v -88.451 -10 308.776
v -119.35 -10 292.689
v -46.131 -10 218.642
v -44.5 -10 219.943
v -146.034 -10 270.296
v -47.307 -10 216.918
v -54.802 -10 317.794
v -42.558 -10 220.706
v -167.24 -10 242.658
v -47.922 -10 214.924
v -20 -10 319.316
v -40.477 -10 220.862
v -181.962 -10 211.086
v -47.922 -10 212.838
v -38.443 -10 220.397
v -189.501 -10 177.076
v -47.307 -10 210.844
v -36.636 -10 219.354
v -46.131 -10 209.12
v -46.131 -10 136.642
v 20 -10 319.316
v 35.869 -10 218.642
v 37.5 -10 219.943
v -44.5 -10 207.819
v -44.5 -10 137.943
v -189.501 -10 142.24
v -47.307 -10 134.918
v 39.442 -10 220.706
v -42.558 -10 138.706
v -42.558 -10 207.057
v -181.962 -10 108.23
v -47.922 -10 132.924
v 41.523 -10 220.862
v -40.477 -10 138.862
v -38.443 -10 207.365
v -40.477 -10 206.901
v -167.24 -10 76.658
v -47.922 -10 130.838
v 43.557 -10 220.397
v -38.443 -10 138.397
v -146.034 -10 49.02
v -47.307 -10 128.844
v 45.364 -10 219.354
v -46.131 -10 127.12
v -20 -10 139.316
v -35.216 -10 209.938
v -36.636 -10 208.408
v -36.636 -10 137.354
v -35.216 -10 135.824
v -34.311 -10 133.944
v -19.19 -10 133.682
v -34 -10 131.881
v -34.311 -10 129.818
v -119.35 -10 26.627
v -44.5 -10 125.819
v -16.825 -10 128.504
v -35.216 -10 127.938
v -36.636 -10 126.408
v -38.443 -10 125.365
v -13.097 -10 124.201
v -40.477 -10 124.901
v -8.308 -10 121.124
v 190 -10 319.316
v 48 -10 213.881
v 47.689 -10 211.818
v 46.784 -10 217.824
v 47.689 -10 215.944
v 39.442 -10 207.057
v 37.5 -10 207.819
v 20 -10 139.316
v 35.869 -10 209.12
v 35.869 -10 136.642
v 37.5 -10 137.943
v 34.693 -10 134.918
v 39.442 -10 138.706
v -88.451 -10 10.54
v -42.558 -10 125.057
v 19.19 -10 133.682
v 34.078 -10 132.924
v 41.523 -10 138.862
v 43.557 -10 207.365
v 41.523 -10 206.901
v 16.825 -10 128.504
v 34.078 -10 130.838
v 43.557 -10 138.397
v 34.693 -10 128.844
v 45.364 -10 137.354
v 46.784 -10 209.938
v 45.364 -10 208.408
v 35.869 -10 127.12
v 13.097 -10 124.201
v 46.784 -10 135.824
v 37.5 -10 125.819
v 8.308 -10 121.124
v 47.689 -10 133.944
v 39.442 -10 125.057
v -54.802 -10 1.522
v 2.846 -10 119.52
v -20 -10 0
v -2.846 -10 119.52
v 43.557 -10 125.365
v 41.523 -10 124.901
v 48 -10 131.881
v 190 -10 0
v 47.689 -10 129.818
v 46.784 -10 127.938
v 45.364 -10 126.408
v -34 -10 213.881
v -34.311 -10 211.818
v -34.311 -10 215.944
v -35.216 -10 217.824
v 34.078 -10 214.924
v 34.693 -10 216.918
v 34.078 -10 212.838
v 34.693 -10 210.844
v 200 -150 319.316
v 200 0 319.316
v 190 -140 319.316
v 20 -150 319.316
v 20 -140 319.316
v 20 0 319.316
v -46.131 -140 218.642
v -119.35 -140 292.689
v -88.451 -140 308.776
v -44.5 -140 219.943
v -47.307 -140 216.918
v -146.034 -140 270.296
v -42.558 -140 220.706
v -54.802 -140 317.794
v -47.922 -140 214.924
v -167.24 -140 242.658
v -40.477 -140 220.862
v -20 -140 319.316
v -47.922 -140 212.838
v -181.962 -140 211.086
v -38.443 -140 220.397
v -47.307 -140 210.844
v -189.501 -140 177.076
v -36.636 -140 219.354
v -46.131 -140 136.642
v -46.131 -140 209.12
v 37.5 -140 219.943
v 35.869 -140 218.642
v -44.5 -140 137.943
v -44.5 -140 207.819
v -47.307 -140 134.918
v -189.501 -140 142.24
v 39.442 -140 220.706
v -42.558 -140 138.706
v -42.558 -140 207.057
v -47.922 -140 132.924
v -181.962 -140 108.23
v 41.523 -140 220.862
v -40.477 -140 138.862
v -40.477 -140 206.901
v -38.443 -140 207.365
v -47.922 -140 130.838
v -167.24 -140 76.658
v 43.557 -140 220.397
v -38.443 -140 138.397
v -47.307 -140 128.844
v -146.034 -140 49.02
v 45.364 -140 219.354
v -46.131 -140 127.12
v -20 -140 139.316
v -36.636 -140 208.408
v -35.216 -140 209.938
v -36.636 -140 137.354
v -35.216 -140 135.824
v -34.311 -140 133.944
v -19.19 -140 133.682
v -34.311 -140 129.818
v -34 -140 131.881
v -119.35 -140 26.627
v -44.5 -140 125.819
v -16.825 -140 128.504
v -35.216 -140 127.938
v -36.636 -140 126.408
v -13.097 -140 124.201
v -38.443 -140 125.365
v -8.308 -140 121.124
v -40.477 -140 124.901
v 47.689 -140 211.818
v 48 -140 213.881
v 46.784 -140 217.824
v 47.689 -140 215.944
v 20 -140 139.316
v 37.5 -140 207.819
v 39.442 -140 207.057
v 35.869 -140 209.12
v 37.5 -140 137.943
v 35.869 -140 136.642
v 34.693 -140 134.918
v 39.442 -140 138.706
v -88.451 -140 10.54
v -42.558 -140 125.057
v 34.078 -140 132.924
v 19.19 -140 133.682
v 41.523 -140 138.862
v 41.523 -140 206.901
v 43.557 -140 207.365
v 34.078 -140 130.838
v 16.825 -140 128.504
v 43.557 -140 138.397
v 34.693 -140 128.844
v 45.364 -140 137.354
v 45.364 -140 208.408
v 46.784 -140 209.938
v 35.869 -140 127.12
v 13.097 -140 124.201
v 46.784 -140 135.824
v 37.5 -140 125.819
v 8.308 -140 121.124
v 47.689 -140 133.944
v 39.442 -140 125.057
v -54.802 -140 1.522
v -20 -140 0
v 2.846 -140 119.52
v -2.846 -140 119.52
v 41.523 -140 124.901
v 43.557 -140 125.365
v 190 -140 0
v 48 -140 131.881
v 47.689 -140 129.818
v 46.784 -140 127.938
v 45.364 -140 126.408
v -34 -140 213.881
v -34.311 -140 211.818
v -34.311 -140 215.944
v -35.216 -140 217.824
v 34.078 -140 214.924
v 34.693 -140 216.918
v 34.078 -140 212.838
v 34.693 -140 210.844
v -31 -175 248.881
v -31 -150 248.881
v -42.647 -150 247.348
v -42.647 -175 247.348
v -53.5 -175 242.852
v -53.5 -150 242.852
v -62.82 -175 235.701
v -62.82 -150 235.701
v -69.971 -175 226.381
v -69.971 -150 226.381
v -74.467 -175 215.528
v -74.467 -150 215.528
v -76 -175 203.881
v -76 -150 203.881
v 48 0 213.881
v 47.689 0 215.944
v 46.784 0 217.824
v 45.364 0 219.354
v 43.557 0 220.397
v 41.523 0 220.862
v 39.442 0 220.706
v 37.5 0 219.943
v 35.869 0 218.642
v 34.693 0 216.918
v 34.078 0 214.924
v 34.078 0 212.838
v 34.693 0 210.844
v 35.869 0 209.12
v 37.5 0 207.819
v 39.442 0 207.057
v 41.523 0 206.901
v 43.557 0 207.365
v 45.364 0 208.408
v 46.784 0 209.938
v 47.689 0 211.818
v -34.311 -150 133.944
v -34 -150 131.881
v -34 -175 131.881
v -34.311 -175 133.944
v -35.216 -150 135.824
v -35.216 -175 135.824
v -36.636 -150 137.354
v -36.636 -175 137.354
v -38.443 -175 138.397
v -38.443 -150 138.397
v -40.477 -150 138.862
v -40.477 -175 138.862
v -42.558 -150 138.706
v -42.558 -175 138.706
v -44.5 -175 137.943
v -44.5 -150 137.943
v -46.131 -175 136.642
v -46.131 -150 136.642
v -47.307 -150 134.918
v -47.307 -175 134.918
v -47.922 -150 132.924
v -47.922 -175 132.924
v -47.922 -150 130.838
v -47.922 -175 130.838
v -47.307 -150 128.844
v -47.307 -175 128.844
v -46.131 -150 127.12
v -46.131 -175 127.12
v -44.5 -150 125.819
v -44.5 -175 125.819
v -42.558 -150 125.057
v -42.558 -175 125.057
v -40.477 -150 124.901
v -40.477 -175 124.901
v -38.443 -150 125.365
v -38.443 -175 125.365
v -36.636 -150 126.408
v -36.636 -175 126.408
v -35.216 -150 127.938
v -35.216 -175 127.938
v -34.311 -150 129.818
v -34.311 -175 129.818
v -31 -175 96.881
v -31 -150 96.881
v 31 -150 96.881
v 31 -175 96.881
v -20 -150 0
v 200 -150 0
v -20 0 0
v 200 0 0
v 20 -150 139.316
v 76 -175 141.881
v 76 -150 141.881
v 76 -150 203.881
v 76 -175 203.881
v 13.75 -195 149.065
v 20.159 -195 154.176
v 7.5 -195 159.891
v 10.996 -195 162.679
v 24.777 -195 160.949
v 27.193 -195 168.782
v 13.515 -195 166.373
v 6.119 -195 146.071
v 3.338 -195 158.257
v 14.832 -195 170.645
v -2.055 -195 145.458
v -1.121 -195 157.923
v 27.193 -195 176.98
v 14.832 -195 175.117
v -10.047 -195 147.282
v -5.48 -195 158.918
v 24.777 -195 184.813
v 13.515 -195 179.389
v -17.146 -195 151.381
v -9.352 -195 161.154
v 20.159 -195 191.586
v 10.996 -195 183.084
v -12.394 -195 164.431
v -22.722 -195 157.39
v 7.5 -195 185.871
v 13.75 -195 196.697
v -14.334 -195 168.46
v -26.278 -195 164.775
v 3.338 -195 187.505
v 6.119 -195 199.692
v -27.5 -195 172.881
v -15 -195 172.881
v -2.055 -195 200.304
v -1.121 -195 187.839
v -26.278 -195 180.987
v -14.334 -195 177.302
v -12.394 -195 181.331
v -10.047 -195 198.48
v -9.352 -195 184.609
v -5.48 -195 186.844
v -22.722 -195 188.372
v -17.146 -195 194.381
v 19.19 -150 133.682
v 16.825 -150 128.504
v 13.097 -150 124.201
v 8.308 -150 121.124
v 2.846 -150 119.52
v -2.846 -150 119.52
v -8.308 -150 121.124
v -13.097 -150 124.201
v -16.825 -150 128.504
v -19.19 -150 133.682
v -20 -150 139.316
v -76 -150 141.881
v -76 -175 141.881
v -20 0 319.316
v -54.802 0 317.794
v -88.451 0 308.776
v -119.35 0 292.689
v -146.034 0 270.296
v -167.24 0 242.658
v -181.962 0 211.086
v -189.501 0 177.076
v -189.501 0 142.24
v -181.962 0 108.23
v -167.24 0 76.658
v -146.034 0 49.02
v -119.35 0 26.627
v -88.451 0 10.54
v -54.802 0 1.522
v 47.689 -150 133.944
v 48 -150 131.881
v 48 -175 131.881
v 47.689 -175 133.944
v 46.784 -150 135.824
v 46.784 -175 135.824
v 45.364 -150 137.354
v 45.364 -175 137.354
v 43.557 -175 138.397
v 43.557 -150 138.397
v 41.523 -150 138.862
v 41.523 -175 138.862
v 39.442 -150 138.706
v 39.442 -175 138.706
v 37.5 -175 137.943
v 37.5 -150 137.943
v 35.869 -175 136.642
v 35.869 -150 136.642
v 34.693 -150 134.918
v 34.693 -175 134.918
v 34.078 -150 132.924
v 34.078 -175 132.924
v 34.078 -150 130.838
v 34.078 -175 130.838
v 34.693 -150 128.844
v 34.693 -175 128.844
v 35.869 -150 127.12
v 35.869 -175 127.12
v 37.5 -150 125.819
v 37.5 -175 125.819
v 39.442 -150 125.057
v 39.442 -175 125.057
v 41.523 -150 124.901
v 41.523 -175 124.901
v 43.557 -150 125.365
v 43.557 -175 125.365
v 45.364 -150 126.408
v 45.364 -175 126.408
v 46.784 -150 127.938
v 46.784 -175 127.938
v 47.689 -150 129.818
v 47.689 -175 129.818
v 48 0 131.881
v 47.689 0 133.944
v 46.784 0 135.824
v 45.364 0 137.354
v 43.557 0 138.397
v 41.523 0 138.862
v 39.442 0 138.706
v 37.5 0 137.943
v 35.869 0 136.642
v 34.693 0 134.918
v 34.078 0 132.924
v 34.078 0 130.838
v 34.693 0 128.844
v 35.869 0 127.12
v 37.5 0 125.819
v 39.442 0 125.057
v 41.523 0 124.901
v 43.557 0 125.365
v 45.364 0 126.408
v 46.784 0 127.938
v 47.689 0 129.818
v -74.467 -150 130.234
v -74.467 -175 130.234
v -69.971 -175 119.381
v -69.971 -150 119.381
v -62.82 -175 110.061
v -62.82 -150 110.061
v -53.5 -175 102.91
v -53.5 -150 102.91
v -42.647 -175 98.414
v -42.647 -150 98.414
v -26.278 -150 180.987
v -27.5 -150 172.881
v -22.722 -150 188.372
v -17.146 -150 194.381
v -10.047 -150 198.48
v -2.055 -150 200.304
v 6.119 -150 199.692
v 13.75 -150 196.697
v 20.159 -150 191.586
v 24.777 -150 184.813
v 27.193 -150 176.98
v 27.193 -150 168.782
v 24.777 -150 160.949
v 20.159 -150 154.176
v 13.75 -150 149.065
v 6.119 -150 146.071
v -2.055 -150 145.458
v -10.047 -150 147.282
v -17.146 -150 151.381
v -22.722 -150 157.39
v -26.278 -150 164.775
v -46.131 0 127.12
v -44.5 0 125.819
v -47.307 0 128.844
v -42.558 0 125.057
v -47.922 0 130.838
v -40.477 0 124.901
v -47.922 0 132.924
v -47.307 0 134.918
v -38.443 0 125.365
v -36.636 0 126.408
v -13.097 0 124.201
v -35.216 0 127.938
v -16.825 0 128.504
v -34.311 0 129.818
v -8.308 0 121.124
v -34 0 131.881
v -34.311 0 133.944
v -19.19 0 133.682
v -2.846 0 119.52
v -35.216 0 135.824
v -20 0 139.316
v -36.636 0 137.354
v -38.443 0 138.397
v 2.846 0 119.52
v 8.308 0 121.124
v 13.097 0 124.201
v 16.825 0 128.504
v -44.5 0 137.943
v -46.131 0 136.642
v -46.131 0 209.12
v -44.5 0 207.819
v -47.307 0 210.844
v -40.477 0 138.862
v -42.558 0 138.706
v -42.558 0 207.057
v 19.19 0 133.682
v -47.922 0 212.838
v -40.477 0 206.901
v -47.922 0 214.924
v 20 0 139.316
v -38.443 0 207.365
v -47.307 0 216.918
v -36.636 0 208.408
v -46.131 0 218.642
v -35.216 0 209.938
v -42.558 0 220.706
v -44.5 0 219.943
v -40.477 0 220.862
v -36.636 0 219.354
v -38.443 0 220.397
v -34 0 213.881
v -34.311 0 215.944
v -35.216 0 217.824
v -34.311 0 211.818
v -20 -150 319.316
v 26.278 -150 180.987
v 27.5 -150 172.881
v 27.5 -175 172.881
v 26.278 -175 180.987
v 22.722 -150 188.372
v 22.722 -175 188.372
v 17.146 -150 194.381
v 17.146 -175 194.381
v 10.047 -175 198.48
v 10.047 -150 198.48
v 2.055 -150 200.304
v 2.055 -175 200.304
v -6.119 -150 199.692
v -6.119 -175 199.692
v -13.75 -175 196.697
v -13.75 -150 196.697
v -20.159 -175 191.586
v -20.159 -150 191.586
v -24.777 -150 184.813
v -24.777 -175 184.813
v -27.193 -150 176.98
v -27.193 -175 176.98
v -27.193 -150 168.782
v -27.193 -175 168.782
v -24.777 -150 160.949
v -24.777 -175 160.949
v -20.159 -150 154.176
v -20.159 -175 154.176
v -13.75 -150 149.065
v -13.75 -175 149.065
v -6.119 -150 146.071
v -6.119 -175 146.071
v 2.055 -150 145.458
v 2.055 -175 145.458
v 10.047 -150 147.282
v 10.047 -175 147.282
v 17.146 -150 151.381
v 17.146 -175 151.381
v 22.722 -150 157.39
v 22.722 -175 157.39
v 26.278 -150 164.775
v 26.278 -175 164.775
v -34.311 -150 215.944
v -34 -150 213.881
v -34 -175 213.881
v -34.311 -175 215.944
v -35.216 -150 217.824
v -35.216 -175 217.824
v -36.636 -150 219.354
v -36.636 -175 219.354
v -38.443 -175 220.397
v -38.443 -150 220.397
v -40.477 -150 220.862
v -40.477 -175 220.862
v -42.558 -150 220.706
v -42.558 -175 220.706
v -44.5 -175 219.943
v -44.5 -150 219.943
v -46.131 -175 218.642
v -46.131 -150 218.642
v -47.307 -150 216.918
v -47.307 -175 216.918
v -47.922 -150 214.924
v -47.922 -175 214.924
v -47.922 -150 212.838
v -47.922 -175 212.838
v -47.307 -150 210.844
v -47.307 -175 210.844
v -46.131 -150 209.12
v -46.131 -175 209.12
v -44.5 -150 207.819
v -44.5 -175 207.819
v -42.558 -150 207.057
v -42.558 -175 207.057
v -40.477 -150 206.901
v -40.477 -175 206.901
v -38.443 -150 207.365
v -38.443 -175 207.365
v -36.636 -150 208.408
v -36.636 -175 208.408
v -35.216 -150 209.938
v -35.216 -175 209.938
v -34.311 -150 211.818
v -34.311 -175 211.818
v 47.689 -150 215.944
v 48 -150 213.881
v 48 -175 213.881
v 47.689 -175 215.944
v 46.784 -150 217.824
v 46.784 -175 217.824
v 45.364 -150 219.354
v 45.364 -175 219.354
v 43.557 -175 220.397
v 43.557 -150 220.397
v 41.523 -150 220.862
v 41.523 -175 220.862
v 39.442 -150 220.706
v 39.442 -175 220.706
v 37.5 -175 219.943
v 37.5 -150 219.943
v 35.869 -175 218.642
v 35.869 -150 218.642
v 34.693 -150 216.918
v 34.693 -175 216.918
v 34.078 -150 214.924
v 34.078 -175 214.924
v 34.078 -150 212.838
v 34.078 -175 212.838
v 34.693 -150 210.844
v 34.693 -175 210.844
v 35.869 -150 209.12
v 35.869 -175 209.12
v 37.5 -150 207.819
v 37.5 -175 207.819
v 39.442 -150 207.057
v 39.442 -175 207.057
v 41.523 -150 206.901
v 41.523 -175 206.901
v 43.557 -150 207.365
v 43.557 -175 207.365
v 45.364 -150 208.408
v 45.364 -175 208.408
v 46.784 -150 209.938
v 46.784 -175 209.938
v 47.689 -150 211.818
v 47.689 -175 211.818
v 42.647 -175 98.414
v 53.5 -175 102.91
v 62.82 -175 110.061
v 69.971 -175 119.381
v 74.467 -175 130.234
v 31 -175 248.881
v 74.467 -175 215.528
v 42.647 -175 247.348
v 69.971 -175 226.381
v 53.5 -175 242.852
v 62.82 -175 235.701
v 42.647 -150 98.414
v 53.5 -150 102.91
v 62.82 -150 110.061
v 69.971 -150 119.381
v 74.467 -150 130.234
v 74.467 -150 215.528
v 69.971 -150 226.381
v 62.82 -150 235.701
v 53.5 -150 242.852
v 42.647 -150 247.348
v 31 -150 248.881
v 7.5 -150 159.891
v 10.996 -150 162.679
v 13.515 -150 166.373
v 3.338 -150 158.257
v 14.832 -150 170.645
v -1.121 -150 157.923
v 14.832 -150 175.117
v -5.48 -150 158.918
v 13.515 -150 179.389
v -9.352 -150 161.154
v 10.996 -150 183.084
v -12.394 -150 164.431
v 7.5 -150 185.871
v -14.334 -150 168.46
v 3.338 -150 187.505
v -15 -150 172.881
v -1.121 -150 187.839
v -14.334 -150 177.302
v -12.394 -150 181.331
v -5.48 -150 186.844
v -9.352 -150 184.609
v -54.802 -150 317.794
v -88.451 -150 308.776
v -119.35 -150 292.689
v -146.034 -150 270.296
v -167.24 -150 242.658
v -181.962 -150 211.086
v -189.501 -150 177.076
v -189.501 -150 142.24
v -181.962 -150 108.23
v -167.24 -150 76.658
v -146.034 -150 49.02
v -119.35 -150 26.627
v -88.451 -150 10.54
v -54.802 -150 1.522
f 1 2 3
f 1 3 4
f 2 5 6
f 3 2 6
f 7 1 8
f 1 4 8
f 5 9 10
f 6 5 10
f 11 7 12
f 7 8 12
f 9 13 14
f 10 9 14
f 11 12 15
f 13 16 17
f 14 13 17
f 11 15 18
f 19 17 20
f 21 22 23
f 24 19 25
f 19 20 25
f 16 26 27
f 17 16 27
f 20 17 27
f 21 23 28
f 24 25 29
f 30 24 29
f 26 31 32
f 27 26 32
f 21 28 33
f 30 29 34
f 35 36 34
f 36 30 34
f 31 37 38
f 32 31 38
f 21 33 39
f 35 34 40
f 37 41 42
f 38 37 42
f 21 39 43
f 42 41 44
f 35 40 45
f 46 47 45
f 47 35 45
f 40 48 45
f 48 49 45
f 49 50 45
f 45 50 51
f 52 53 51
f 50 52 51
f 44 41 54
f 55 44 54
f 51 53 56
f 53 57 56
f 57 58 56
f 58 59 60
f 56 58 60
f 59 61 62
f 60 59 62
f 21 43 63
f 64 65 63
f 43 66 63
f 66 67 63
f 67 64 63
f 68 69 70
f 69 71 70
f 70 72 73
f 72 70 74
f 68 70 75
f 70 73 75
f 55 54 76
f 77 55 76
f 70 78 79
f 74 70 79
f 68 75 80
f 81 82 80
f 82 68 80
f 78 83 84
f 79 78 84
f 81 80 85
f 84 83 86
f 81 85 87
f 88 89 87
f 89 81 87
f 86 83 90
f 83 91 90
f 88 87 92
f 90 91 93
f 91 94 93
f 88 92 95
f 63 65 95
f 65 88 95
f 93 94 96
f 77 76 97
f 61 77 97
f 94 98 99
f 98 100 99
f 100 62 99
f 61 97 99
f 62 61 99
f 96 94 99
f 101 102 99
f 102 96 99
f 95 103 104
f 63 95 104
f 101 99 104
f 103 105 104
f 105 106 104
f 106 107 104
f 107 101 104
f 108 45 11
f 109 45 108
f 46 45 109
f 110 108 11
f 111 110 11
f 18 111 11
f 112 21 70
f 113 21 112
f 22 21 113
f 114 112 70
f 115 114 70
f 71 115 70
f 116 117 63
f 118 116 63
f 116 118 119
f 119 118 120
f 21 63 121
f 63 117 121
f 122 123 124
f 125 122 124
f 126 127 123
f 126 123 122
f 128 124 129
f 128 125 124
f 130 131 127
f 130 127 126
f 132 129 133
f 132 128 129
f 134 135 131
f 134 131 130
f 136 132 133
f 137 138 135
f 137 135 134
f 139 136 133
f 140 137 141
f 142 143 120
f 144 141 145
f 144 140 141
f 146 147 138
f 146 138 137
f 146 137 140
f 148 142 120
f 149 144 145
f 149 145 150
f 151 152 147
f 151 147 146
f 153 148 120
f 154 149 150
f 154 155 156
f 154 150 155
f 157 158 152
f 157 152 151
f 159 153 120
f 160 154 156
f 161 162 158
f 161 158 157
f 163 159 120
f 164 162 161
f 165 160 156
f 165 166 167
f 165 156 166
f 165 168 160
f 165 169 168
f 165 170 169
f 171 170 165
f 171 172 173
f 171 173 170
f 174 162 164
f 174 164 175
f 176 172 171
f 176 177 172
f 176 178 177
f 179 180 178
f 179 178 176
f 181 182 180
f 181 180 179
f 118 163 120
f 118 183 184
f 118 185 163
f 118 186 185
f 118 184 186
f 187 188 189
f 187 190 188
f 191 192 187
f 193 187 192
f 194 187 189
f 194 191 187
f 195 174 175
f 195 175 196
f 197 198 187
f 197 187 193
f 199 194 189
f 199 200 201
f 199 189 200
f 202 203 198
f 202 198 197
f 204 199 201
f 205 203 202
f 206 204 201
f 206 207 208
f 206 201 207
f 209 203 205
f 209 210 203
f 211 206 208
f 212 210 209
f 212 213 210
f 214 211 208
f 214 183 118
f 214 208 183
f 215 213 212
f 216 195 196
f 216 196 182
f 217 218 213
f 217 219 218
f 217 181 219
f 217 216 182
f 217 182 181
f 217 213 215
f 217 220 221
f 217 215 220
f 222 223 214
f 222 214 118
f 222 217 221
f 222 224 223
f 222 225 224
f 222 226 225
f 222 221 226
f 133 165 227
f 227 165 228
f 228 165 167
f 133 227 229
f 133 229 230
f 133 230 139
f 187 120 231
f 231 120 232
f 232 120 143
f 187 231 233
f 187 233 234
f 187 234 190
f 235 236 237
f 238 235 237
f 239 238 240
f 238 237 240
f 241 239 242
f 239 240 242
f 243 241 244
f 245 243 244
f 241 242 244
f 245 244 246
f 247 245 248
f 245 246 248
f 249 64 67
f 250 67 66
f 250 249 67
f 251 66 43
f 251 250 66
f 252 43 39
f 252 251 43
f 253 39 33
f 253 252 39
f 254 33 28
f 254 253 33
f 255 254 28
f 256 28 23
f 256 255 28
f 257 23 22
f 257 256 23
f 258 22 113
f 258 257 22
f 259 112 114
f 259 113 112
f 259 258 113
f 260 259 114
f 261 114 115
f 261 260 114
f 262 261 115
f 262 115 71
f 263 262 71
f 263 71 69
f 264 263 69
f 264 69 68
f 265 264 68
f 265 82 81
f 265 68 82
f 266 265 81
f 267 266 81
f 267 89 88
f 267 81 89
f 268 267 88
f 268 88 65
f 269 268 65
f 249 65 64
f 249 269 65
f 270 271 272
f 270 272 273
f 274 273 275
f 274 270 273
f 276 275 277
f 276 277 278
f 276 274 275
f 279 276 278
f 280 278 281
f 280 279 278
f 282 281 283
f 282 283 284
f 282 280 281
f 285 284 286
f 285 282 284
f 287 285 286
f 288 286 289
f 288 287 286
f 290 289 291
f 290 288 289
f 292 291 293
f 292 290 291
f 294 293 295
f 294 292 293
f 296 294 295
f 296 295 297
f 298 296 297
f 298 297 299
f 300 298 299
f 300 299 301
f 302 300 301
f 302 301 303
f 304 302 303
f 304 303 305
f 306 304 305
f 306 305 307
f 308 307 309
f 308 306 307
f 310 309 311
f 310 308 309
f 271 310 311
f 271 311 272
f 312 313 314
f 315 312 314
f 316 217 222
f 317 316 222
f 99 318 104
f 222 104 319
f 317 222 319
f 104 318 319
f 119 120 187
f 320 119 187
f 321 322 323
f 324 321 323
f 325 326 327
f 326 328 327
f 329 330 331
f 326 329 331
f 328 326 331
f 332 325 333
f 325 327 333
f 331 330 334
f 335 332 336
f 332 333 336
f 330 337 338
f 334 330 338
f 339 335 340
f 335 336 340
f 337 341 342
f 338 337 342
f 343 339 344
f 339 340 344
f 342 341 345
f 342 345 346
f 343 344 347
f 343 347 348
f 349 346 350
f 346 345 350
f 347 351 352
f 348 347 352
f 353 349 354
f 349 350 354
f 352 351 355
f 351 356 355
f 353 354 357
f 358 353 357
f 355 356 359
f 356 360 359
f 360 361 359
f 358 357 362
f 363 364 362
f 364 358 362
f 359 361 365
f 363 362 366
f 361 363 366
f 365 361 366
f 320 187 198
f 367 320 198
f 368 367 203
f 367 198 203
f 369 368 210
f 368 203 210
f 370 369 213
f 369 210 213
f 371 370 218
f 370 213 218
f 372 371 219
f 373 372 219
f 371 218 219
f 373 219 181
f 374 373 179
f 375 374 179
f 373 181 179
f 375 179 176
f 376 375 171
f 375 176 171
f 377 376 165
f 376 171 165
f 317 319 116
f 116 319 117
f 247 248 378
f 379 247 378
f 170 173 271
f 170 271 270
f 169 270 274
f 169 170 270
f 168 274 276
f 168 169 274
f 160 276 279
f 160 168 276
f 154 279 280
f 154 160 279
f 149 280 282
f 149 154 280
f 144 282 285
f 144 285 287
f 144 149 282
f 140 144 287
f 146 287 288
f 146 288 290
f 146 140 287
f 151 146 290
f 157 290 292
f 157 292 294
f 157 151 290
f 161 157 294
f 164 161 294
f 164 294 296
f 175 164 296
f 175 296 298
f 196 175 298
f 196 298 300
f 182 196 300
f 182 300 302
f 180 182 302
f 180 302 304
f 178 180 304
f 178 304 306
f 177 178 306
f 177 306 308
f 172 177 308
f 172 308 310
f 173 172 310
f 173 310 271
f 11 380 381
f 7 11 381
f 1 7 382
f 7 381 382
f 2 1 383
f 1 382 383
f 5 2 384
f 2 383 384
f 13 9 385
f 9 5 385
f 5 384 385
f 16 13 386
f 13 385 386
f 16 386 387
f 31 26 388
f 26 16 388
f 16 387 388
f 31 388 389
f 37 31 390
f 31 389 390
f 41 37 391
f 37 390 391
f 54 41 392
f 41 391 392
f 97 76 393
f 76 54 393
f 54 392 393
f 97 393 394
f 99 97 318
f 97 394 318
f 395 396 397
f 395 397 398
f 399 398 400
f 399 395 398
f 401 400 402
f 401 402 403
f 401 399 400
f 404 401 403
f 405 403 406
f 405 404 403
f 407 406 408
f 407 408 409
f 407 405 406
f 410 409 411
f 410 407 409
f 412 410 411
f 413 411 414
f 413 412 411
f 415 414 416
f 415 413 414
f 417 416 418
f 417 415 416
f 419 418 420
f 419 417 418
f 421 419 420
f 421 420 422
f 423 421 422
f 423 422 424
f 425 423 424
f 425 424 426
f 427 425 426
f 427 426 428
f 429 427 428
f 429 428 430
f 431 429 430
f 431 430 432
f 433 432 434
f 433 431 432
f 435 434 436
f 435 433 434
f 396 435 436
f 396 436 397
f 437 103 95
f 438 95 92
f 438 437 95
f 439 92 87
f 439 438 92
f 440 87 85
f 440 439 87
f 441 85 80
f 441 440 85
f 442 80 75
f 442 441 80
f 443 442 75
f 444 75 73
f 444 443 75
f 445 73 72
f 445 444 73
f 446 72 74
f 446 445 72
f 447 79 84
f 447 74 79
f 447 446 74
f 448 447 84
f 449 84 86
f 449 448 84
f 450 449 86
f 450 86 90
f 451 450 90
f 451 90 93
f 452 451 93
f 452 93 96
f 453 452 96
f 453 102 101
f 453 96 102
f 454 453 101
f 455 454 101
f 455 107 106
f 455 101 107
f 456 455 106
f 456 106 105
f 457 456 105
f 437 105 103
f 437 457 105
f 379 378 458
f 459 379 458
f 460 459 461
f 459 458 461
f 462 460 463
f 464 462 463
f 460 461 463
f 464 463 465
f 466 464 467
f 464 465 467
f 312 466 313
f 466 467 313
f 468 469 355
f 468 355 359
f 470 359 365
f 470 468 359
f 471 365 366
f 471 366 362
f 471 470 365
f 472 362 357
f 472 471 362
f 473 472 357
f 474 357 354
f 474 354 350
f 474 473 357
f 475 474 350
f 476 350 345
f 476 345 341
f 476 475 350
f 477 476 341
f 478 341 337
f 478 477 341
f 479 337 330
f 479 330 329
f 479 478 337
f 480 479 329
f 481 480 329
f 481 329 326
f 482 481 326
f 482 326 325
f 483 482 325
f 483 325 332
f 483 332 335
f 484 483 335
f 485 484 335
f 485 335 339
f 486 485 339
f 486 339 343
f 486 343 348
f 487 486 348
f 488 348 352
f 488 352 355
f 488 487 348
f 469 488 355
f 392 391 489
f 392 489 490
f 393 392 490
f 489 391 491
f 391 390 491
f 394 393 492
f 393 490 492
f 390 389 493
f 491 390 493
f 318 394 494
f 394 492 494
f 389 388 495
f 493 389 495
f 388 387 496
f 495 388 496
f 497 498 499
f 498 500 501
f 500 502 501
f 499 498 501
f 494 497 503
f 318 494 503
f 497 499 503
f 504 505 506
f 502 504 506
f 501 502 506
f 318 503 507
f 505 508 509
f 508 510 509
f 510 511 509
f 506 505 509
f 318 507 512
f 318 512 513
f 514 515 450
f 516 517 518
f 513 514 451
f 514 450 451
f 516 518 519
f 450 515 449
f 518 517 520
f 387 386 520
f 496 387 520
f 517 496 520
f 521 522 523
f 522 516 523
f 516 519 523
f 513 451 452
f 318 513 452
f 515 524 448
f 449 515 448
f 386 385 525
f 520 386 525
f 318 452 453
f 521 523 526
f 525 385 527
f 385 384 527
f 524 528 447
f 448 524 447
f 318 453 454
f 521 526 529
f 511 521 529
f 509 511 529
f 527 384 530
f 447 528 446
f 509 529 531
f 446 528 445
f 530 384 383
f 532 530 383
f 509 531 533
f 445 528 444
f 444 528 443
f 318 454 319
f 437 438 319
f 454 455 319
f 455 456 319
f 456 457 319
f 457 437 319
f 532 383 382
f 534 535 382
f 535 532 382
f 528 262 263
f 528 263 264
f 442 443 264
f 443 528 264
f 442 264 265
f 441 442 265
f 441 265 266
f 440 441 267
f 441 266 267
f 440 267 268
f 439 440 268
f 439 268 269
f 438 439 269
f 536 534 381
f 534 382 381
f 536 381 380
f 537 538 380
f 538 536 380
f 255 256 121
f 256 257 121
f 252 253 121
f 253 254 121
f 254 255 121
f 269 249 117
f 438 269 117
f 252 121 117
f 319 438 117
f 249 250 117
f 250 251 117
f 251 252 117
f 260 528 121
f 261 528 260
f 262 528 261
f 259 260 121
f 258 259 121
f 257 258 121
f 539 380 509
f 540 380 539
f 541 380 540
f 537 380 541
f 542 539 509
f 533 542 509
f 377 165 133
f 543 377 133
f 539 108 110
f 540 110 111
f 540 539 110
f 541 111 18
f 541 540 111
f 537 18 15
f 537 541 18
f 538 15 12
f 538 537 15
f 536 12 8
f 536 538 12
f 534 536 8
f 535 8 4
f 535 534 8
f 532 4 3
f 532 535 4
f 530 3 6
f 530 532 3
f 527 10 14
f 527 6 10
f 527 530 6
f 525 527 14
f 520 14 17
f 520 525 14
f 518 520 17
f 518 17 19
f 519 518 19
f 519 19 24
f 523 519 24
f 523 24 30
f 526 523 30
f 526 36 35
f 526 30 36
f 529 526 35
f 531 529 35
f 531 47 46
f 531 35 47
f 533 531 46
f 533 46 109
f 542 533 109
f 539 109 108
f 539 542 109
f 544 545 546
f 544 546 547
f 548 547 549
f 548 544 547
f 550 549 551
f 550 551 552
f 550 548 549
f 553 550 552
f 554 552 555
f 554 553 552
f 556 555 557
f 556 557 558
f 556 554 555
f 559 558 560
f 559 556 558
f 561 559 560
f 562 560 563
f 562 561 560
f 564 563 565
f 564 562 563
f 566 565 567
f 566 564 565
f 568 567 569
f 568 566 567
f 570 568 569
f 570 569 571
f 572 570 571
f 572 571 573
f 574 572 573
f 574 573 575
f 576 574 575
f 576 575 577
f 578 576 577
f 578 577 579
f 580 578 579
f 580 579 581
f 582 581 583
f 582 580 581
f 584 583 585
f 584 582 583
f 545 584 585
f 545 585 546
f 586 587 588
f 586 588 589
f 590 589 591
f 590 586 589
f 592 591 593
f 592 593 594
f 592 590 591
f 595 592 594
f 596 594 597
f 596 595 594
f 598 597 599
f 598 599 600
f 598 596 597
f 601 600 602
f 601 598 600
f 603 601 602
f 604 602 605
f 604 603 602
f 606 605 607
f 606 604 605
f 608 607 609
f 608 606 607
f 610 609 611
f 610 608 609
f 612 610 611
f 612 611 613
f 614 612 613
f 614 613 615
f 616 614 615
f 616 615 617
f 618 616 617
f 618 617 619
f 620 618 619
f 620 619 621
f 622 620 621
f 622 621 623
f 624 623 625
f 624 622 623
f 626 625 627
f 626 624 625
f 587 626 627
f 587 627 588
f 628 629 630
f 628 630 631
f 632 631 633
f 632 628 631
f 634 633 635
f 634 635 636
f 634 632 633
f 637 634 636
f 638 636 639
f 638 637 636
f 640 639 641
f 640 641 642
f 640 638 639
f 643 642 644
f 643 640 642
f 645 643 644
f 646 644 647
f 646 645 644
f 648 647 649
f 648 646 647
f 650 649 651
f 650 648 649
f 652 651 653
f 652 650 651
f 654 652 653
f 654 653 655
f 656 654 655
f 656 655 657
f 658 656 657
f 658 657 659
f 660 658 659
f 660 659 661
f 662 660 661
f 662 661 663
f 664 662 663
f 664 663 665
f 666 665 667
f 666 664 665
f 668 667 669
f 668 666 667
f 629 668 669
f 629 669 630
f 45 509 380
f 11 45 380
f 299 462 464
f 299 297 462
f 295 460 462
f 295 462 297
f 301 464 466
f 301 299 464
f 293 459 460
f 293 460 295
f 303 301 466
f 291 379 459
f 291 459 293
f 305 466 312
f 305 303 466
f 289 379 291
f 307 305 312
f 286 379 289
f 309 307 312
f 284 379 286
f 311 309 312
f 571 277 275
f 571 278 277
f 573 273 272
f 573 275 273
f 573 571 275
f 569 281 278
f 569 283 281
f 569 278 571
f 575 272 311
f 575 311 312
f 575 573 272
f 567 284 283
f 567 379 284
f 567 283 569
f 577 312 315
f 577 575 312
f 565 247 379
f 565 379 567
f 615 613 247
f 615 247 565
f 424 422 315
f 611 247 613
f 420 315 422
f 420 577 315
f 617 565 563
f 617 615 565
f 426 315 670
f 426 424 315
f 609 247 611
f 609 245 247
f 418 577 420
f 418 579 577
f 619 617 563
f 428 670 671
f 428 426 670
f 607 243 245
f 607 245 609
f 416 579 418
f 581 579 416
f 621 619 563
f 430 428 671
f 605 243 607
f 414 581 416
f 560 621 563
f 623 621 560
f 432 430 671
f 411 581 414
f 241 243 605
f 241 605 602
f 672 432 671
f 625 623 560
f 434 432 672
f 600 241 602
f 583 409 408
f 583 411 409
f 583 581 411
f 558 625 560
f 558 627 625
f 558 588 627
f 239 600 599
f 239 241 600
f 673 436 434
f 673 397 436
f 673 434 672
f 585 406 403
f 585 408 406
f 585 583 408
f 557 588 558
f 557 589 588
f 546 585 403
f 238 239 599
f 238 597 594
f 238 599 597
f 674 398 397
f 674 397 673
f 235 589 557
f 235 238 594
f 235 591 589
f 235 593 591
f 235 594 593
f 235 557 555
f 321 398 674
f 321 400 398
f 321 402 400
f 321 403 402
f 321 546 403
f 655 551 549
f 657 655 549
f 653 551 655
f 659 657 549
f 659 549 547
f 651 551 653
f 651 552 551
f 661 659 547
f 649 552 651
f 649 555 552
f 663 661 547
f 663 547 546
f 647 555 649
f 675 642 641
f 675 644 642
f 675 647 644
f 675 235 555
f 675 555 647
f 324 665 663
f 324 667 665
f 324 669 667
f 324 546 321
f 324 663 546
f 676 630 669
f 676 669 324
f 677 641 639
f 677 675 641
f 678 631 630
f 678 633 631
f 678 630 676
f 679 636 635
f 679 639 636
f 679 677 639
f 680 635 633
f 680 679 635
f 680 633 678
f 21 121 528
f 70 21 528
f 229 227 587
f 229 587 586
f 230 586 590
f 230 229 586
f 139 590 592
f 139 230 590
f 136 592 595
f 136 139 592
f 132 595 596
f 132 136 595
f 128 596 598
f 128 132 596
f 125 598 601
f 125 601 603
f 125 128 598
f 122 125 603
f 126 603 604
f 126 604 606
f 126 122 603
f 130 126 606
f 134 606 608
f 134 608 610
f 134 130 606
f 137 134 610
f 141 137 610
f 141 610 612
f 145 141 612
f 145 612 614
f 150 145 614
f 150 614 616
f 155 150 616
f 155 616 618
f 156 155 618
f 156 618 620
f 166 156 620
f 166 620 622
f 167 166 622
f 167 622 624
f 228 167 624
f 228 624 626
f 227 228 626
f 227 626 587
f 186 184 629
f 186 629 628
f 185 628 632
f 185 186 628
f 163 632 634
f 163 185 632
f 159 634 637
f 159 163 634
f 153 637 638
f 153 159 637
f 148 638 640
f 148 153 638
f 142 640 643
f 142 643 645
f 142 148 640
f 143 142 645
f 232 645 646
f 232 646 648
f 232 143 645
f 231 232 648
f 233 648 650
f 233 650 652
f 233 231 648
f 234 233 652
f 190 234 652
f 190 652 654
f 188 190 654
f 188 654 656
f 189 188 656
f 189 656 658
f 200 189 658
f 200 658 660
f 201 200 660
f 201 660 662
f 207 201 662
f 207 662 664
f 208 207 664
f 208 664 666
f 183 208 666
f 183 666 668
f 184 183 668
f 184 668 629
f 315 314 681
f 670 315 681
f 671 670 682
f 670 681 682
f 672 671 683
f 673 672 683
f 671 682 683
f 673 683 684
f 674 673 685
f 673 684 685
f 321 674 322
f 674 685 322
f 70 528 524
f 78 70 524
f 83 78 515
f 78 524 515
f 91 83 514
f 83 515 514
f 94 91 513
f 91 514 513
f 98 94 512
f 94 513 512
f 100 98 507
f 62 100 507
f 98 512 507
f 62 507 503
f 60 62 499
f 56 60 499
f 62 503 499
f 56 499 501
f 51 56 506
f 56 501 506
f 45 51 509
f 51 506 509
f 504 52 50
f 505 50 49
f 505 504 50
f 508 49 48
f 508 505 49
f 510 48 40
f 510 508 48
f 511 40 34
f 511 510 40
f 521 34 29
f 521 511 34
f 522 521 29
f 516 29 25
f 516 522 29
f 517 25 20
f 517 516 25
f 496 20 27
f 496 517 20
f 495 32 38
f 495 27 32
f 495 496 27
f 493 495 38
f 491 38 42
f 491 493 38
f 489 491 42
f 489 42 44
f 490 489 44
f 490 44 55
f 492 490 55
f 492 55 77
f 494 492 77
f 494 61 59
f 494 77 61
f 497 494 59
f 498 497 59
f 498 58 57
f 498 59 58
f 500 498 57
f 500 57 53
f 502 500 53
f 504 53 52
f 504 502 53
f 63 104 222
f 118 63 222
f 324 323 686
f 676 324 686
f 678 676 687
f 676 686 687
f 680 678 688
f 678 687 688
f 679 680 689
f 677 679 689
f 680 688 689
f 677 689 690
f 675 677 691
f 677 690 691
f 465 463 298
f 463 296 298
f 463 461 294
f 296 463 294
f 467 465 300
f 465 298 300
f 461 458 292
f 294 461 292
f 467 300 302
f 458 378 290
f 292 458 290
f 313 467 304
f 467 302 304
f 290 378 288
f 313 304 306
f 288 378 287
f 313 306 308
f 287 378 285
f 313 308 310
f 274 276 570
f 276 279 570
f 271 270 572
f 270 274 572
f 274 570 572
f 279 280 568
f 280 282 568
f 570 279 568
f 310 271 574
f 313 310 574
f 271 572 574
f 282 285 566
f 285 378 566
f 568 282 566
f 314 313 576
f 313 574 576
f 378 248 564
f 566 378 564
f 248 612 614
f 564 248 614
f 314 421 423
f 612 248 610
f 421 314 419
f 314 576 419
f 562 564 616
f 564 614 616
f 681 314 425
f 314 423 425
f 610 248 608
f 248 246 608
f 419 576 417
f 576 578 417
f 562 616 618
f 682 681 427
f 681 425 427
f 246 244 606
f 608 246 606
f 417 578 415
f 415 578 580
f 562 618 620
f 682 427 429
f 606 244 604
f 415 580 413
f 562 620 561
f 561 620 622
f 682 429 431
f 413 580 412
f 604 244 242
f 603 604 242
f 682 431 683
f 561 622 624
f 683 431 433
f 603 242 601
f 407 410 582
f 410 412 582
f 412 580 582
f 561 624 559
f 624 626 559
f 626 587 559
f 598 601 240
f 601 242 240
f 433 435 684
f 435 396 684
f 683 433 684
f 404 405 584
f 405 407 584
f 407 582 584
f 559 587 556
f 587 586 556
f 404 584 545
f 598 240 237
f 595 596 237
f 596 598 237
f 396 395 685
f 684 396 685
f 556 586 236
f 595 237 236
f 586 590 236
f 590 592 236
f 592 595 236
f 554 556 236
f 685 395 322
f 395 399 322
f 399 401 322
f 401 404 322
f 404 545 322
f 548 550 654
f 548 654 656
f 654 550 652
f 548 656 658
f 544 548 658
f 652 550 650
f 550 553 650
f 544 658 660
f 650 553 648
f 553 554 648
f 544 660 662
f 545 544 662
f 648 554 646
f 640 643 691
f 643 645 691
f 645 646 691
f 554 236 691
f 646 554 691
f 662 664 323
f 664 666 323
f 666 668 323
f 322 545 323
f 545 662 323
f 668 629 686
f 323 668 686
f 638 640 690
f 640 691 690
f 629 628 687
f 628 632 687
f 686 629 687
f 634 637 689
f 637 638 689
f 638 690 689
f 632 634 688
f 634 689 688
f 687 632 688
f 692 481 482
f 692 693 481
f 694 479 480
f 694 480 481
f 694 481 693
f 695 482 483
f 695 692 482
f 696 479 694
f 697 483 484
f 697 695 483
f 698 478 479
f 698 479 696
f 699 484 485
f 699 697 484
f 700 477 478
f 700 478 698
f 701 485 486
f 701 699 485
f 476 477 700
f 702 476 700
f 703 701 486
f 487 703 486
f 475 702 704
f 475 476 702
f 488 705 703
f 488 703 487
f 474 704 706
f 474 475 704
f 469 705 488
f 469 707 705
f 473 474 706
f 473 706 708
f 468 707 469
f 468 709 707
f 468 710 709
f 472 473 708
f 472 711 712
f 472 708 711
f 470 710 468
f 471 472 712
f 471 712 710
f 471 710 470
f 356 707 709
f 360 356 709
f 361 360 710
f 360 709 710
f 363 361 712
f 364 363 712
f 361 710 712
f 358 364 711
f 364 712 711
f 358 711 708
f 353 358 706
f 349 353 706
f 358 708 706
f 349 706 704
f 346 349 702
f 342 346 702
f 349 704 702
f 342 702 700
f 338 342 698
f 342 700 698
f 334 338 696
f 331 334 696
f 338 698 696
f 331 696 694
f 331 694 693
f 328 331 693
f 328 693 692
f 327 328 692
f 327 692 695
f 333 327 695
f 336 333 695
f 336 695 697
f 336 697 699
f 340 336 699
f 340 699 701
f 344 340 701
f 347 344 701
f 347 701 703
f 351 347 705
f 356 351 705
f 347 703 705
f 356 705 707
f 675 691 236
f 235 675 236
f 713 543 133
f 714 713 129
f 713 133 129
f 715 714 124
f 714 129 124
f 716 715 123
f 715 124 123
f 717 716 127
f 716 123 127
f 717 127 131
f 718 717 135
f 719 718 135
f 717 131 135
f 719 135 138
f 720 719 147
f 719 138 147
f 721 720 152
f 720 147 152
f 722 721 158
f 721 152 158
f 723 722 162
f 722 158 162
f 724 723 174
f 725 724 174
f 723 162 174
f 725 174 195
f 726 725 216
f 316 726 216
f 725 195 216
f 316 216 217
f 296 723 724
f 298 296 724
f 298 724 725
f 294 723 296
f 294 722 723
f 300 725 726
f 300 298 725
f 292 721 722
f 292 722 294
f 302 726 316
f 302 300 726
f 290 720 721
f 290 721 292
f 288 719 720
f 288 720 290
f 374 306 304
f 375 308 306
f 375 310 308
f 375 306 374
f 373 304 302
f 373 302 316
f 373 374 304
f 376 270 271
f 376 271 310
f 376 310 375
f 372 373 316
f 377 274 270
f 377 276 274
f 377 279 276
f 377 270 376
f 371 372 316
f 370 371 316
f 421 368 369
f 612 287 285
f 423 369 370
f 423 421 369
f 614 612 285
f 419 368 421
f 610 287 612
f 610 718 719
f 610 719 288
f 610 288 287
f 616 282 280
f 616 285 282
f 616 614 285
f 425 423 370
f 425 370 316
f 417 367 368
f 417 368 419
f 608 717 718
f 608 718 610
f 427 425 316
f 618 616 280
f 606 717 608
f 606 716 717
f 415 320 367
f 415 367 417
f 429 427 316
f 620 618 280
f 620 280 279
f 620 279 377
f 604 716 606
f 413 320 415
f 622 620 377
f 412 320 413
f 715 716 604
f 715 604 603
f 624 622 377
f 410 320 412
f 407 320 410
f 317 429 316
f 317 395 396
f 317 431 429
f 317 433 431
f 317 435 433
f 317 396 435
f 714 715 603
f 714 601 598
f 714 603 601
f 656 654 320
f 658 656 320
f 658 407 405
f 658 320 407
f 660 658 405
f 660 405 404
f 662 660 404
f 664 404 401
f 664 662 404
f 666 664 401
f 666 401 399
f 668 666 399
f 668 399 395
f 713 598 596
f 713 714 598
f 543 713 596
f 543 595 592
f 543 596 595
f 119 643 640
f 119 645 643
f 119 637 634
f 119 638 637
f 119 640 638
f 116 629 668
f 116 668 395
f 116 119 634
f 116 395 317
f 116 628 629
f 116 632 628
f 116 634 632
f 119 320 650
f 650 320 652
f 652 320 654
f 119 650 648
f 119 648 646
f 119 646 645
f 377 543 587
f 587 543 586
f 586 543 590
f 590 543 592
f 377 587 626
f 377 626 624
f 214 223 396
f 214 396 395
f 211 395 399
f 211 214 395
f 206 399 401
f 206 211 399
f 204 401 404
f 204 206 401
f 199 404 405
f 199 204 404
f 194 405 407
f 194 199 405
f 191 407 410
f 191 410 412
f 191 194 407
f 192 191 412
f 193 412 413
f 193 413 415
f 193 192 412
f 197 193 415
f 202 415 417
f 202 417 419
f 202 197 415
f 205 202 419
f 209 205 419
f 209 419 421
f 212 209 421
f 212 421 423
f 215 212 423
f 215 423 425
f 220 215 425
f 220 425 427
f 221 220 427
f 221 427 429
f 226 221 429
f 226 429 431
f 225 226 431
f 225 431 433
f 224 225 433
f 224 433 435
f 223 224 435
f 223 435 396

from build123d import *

# Parameters (mm, degrees)
F0_R     = 7
F1_DEPTH = 150
F2_W     = 390
F2_H     = 130
F3_DEPTH = 5000
F4_R     = 7
F4_R_2   = 27.5
F5_DEPTH = 25
F6_R     = 27.5
F6_R_2   = 15
F7_DEPTH = 45


with BuildPart() as f1:
    # F0 (on Front) → F1 (new body)
    with BuildSketch(Plane.XZ):
        with BuildLine():
            Line((200, 319.316469), (20, 319.316469))
            Line((20, 319.316469), (20, 139.316469))
            ThreePointArc((20, 139.316469), (0, 119.316469), (-20, 139.316469))
            Line((-20, 139.316469), (-20, 319.316469))
            ThreePointArc((-20, 319.316469), (-190.452185, 159.658234), (-20, 0))
            Line((-20, 0), (200, 0))
            Line((200, 0), (200, 319.316469))
        make_face()
        with Locations((-41, 131.881108)):
            Circle(F0_R, mode=Mode.SUBTRACT)
        with Locations((41, 131.881108)):
            Circle(F0_R, mode=Mode.SUBTRACT)
        with Locations((-41, 213.881108)):
            Circle(F0_R, mode=Mode.SUBTRACT)
        with Locations((41, 213.881108)):
            Circle(F0_R, mode=Mode.SUBTRACT)
    extrude(amount=F1_DEPTH)

    # F2 (on face) → F3 (cut, symmetric)
    with BuildSketch(Plane(origin=(0, 0, 0), x_dir=(1, 0, 0), z_dir=(0, 0, -1))):
        with Locations((-5, 75)):
            Rectangle(F2_W, F2_H)
    extrude(amount=F3_DEPTH, both=True, mode=Mode.SUBTRACT)


with BuildPart() as f5:
    # F4 (on face) → F5 (new body)
    with BuildSketch(Plane.XZ.offset(150)):
        with BuildLine():
            ThreePointArc((-76, 141.881108), (-62.819805, 110.061303), (-31, 96.881108))
            Line((-31, 96.881108), (31, 96.881108))
            ThreePointArc((31, 96.881108), (62.819805, 110.061303), (76, 141.881108))
            Line((76, 141.881108), (76, 203.881108))
            ThreePointArc((76, 203.881108), (62.819805, 235.700913), (31, 248.881108))
            Line((31, 248.881108), (-31, 248.881108))
            ThreePointArc((-31, 248.881108), (-62.819805, 235.700913), (-76, 203.881108))
            Line((-76, 203.881108), (-76, 141.881108))
        make_face()
        with Locations((-41, 131.881108)):
            Circle(F4_R, mode=Mode.SUBTRACT)
        with Locations((41, 131.881108)):
            Circle(F4_R, mode=Mode.SUBTRACT)
        with Locations((-41, 213.881108)):
            Circle(F4_R, mode=Mode.SUBTRACT)
        with Locations((0, 172.881108)):
            Circle(F4_R_2, mode=Mode.SUBTRACT)
        with Locations((41, 213.881108)):
            Circle(F4_R, mode=Mode.SUBTRACT)
    extrude(amount=F5_DEPTH)


with BuildPart() as f7:
    # F6 (on face) → F7 (new body)
    with BuildSketch(Plane(origin=(0, -150, 0), x_dir=(-1, 0, 0), z_dir=(0, 1, 0))):
        with Locations((0, 172.881108)):
            Circle(F6_R)
        with Locations((0, 172.881108)):
            Circle(F6_R_2, mode=Mode.SUBTRACT)
    extrude(amount=-F7_DEPTH)


solid = Compound([f1.part, f5.part, f7.part])
